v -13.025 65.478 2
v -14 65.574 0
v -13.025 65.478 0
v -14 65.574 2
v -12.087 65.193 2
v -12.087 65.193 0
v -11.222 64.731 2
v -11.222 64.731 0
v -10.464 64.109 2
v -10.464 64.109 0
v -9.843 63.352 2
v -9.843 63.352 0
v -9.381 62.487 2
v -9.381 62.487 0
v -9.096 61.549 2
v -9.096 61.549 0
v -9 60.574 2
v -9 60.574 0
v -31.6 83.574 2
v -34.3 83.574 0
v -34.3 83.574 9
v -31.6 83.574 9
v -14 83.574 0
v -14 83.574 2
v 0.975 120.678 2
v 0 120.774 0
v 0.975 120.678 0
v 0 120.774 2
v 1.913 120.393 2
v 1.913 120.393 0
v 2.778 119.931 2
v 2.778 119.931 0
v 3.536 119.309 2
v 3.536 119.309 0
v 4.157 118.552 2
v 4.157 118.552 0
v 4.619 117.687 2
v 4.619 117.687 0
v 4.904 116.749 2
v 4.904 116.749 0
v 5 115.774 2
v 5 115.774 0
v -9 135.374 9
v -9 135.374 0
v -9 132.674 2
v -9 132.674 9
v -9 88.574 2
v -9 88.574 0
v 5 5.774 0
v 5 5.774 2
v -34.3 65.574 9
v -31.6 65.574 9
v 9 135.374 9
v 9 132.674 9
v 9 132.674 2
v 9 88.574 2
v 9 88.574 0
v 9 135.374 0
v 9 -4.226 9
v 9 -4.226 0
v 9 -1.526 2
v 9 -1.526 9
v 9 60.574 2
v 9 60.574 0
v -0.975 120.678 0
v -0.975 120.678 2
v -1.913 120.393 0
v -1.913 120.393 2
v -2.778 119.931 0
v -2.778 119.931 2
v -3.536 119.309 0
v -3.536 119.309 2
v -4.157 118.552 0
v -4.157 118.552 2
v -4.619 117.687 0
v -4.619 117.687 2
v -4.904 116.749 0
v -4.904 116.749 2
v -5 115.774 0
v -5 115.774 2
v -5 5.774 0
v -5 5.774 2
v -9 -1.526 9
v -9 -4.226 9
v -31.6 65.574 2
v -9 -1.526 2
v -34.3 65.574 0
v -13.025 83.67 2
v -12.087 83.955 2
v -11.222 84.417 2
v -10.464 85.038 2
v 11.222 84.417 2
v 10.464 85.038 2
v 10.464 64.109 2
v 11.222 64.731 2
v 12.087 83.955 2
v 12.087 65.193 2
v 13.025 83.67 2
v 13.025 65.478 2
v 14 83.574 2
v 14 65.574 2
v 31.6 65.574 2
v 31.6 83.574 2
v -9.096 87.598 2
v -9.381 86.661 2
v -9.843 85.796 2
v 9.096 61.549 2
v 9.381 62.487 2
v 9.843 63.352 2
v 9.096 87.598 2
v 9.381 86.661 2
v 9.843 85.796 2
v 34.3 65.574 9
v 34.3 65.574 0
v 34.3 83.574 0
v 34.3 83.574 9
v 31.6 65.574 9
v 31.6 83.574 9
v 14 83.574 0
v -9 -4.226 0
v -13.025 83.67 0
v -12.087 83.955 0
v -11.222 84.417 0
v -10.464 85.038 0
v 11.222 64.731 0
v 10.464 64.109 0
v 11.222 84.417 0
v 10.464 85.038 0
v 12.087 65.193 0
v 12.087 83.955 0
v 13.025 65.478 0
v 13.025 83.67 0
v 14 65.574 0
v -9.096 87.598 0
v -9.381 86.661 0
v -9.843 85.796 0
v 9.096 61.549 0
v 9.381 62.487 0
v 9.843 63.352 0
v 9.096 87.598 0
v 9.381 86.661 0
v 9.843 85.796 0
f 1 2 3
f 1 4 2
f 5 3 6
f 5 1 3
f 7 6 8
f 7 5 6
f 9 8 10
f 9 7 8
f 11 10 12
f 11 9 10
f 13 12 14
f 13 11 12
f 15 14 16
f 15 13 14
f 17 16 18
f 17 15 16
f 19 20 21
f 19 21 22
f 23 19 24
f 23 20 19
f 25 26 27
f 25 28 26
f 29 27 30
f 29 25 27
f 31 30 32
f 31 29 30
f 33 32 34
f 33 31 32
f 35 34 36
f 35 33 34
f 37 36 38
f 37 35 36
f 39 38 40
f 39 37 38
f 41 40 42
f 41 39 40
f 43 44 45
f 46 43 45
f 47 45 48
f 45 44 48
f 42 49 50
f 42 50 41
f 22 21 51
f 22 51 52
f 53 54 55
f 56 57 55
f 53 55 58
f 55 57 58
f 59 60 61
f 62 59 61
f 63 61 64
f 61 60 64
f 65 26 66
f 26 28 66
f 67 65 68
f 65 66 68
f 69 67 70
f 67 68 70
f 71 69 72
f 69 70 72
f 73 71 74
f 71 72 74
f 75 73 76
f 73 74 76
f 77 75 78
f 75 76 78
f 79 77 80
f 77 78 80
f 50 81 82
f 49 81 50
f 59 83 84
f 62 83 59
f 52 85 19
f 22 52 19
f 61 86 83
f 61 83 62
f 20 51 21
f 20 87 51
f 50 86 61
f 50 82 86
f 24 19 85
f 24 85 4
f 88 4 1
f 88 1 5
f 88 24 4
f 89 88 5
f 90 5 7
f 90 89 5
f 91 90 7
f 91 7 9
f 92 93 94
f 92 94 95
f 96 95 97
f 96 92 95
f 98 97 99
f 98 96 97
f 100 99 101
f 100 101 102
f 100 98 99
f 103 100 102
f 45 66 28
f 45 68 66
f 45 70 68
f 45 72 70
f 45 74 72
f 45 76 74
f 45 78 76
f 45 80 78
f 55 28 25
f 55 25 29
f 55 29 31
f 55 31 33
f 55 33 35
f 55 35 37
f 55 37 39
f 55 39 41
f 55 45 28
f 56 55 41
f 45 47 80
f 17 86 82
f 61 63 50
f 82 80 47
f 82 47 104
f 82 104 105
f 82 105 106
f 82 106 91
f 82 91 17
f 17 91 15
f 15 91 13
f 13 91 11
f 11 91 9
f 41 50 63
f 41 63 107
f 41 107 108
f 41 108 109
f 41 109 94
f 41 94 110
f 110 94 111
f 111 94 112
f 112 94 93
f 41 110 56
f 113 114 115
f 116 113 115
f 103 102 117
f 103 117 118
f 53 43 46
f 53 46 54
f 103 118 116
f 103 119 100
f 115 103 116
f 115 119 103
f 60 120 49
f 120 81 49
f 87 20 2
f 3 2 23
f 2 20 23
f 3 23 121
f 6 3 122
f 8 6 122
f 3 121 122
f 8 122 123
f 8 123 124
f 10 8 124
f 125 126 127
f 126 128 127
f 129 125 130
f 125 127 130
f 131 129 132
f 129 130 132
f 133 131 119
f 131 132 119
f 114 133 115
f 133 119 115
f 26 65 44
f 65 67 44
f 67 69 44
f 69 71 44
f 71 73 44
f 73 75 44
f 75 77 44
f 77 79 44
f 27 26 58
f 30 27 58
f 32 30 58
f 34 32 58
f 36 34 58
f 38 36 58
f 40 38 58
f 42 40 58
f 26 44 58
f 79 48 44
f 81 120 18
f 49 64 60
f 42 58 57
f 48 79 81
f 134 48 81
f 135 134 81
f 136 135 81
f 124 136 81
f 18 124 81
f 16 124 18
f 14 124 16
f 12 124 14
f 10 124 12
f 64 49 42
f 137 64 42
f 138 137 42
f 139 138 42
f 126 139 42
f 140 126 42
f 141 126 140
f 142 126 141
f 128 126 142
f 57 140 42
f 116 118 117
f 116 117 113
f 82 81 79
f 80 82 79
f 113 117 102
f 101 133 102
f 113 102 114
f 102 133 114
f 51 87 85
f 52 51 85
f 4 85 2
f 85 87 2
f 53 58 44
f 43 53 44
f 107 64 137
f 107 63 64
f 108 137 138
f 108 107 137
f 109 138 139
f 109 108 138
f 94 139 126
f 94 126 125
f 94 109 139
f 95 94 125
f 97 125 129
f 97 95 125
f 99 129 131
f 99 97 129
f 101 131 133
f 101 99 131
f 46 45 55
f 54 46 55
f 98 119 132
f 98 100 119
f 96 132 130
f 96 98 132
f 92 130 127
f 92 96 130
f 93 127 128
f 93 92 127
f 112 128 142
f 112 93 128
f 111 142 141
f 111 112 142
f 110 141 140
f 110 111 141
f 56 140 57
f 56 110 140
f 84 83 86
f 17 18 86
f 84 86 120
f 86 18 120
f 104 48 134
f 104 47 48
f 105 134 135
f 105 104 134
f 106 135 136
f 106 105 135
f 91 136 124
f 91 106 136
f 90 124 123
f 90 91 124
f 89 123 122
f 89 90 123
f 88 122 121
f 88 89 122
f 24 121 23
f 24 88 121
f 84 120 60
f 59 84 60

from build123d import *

# Parameters (mm, degrees)
F0_W     = 10
F0_H     = 115
F0_W_2   = 25.3
F0_H_2   = 18
F1_DEPTH = 2
F3_W     = 2.7
F3_H     = 18
F3_W_2   = 18
F3_H_2   = 2.7
F4_DEPTH = 7
F5_R     = 4.99999


# Not quite as in the source:
# - a fillet or chamfer is up to 0.001 mm smaller than in the source, because OpenCascade refuses the exact size


with BuildPart() as f1:
    # F0 (on Top) → F1 (new body)
    with BuildSketch(Plane.XY):
        Polygon((9, 135.3739356415), (-9, 135.3739356415), (-9, 83.5739356415), (-9, 65.5739356415), (-9, -4.2260643585), (9, -4.2260643585), (9, 65.5739356415), (9, 83.5739356415), align=None)
        with Locations((0, 63.2739356415)):
            Rectangle(F0_W, F0_H, mode=Mode.SUBTRACT)
        with Locations((-21.65, 74.5739356415)):
            Rectangle(F0_W_2, F0_H_2)
        with Locations((21.65, 74.5739356415)):
            Rectangle(F0_W_2, F0_H_2)
    extrude(amount=F1_DEPTH)

    # F3 (on face) → F4 (join)
    with BuildSketch(Plane.XY.offset(2)):
        with Locations((-32.95, 74.5739356415)):
            Rectangle(F3_W, F3_H)
        with Locations((32.95, 74.5739356415)):
            Rectangle(F3_W, F3_H)
        with Locations((0, 134.0239356415)):
            Rectangle(F3_W_2, F3_H_2)
        with Locations((0, -2.8760643585)):
            Rectangle(F3_W_2, F3_H_2)
    extrude(amount=F4_DEPTH)

    # F5 (radius 5 in the source; OpenCascade refuses exactly that, so slightly less here)
    f5_edges = [f1.edges().sort_by_distance(p)[0] for p in [
        (-9, 65.573936, 1),
        (9, 65.573936, 1),
        (9, 83.573936, 1),
        (-9, 83.573936, 1),
        (-5, 120.773936, 1),
        (5, 120.773936, 1),
    ]]
    fillet(f5_edges, radius=F5_R)


solid = f1.part
